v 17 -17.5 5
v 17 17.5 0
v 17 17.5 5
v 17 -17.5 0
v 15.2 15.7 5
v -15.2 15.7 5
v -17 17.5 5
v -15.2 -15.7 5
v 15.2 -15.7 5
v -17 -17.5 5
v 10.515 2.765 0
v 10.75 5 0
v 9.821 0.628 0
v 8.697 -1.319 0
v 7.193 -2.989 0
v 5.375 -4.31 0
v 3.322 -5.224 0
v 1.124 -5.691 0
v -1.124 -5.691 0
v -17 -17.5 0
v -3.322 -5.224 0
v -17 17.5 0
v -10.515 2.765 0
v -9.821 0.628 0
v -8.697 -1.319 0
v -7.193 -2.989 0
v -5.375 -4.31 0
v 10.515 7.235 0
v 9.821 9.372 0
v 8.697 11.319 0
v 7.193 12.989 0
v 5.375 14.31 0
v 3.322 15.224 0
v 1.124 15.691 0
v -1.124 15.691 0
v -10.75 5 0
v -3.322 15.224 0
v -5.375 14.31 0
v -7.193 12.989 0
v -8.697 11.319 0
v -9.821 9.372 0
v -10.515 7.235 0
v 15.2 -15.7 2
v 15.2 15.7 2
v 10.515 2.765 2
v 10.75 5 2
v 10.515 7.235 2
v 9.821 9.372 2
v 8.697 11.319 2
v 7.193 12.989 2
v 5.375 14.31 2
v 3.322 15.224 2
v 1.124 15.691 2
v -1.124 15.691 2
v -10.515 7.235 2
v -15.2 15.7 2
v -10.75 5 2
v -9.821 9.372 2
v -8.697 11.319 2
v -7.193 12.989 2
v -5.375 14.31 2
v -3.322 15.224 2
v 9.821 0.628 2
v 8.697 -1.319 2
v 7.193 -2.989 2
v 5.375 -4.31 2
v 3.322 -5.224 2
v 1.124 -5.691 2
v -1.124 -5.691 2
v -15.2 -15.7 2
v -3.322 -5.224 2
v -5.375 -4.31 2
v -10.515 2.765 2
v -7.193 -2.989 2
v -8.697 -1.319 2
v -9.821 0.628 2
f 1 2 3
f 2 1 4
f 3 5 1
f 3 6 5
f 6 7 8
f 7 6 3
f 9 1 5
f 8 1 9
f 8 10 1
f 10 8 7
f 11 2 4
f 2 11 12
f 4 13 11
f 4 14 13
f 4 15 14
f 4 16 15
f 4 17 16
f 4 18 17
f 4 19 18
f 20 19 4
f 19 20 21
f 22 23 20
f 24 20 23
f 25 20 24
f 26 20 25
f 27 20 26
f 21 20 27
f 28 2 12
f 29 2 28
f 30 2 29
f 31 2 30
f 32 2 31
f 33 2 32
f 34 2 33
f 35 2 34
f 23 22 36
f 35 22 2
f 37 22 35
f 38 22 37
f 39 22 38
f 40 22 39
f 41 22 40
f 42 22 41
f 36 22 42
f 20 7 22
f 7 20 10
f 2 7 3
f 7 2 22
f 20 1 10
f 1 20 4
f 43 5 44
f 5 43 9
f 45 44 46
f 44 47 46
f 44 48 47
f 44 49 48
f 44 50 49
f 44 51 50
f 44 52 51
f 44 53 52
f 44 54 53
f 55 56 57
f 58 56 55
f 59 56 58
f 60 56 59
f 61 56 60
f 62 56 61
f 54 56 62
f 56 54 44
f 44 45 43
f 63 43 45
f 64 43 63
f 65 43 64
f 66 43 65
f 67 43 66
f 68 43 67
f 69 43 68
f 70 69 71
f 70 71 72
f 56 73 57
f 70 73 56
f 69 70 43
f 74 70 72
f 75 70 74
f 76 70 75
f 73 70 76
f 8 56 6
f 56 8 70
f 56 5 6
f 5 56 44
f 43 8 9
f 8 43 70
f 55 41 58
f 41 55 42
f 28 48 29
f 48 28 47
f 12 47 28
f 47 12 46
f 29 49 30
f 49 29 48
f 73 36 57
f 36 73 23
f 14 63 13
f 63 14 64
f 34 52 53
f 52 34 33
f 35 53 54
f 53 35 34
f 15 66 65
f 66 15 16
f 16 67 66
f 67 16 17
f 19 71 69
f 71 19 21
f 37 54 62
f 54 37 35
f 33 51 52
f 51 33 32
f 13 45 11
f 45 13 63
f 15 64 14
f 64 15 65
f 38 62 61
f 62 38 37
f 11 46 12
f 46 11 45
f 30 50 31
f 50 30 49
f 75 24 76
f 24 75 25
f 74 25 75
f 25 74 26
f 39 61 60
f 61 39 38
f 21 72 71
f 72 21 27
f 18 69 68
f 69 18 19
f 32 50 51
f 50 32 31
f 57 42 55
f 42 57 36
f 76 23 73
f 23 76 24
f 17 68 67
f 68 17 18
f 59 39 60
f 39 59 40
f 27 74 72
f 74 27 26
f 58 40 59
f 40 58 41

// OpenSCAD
// file: config.scad
$fs=0.5;

di_m4_t = 3.6;
di_m4_d = 4.4;

di_m4_nut = 8.5;

di_m2_t = 1.8;
// main file
include <config.scad>

$fs=0.1;

w = 26;
t = 2;
l = 27;
h = 28;
stand = 3;
p = 2.5;
cable_width = 18;

module IR_camera_case() {
    
    union() {
        difference() {
            // Main box
            translate([0, 0, (h+t+p+stand)/2]) 
            cube([26+2*t, 27+2*t, h+t+p+stand], center=true);
            // Main hole
            translate([0, 0, (h+t+p+stand)/2+t]) 
            cube([26, 27, h+t+p+stand], center=true);
            // Lens lip
            translate([0, 0, (h+t+p+stand)/2+h+t+stand]) 
            cube([26+t, 27+t, h+t+p+stand], center=true);
            // Cable hole
            translate([0, -15, t+stand]) 
            cube([cable_width, 10, 1], center=true);
        }
        difference() {
            x = 21;
            union() {
                translate([-x/2, 27/2-2]) cylinder(d=8, h=t+stand);
                translate([x/2, 27/2-2]) cylinder(d=8, h=t+stand);
                translate([-x/2, 27/2-2-13.5]) cylinder(d=8, h=t+stand);
                translate([x/2, 27/2-2-13.5]) cylinder(d=8, h=t+stand);
            }
            translate([-x/2, 27/2-2, 1]) cylinder(d=di_m2_t, h=t+stand);
            translate([x/2, 27/2-2, 1]) cylinder(d=di_m2_t, h=t+stand);
            translate([-x/2, 27/2-2-13.5, 1]) cylinder(d=di_m2_t, h=t+stand);
            translate([x/2, 27/2-2-13.5, 1]) cylinder(d=di_m2_t, h=t+stand);
        }
        difference() {
            hull() {
                translate([0, 5+l/2+t, 1.5])
                cube([w+2*t, 10, 3], center=true);
                translate([0, l/2+t/2, h/2])
                cube([w+2*t, t, h], center=true);
            }
            translate([0, l/2+5+t, h/2+3])
            cube([w, 10, h], center=true);
            
            translate([8, l/2+t+5]) cylinder(d=di_m4_d, h=5);
            translate([-8, l/2+t+5]) cylinder(d=di_m4_d, h=5);
        }
    }
}

module IR_camera_cap() {
    g = 0.2;
    difference() {
        translate([0, 0, (3+t)/2]) cube([w+4*t, l+4*t, 3+t], center=true);
        translate([0, 0, (3+t)/2+t]) cube([w+2*t+2*g, l+2*t+2*g, 3+t], center=true);
        translate([0, l/2+t-10.5, -1]) cylinder(d=21.5, h=10);
    }
}

IR_camera_cap();

//IR_camera_case();
